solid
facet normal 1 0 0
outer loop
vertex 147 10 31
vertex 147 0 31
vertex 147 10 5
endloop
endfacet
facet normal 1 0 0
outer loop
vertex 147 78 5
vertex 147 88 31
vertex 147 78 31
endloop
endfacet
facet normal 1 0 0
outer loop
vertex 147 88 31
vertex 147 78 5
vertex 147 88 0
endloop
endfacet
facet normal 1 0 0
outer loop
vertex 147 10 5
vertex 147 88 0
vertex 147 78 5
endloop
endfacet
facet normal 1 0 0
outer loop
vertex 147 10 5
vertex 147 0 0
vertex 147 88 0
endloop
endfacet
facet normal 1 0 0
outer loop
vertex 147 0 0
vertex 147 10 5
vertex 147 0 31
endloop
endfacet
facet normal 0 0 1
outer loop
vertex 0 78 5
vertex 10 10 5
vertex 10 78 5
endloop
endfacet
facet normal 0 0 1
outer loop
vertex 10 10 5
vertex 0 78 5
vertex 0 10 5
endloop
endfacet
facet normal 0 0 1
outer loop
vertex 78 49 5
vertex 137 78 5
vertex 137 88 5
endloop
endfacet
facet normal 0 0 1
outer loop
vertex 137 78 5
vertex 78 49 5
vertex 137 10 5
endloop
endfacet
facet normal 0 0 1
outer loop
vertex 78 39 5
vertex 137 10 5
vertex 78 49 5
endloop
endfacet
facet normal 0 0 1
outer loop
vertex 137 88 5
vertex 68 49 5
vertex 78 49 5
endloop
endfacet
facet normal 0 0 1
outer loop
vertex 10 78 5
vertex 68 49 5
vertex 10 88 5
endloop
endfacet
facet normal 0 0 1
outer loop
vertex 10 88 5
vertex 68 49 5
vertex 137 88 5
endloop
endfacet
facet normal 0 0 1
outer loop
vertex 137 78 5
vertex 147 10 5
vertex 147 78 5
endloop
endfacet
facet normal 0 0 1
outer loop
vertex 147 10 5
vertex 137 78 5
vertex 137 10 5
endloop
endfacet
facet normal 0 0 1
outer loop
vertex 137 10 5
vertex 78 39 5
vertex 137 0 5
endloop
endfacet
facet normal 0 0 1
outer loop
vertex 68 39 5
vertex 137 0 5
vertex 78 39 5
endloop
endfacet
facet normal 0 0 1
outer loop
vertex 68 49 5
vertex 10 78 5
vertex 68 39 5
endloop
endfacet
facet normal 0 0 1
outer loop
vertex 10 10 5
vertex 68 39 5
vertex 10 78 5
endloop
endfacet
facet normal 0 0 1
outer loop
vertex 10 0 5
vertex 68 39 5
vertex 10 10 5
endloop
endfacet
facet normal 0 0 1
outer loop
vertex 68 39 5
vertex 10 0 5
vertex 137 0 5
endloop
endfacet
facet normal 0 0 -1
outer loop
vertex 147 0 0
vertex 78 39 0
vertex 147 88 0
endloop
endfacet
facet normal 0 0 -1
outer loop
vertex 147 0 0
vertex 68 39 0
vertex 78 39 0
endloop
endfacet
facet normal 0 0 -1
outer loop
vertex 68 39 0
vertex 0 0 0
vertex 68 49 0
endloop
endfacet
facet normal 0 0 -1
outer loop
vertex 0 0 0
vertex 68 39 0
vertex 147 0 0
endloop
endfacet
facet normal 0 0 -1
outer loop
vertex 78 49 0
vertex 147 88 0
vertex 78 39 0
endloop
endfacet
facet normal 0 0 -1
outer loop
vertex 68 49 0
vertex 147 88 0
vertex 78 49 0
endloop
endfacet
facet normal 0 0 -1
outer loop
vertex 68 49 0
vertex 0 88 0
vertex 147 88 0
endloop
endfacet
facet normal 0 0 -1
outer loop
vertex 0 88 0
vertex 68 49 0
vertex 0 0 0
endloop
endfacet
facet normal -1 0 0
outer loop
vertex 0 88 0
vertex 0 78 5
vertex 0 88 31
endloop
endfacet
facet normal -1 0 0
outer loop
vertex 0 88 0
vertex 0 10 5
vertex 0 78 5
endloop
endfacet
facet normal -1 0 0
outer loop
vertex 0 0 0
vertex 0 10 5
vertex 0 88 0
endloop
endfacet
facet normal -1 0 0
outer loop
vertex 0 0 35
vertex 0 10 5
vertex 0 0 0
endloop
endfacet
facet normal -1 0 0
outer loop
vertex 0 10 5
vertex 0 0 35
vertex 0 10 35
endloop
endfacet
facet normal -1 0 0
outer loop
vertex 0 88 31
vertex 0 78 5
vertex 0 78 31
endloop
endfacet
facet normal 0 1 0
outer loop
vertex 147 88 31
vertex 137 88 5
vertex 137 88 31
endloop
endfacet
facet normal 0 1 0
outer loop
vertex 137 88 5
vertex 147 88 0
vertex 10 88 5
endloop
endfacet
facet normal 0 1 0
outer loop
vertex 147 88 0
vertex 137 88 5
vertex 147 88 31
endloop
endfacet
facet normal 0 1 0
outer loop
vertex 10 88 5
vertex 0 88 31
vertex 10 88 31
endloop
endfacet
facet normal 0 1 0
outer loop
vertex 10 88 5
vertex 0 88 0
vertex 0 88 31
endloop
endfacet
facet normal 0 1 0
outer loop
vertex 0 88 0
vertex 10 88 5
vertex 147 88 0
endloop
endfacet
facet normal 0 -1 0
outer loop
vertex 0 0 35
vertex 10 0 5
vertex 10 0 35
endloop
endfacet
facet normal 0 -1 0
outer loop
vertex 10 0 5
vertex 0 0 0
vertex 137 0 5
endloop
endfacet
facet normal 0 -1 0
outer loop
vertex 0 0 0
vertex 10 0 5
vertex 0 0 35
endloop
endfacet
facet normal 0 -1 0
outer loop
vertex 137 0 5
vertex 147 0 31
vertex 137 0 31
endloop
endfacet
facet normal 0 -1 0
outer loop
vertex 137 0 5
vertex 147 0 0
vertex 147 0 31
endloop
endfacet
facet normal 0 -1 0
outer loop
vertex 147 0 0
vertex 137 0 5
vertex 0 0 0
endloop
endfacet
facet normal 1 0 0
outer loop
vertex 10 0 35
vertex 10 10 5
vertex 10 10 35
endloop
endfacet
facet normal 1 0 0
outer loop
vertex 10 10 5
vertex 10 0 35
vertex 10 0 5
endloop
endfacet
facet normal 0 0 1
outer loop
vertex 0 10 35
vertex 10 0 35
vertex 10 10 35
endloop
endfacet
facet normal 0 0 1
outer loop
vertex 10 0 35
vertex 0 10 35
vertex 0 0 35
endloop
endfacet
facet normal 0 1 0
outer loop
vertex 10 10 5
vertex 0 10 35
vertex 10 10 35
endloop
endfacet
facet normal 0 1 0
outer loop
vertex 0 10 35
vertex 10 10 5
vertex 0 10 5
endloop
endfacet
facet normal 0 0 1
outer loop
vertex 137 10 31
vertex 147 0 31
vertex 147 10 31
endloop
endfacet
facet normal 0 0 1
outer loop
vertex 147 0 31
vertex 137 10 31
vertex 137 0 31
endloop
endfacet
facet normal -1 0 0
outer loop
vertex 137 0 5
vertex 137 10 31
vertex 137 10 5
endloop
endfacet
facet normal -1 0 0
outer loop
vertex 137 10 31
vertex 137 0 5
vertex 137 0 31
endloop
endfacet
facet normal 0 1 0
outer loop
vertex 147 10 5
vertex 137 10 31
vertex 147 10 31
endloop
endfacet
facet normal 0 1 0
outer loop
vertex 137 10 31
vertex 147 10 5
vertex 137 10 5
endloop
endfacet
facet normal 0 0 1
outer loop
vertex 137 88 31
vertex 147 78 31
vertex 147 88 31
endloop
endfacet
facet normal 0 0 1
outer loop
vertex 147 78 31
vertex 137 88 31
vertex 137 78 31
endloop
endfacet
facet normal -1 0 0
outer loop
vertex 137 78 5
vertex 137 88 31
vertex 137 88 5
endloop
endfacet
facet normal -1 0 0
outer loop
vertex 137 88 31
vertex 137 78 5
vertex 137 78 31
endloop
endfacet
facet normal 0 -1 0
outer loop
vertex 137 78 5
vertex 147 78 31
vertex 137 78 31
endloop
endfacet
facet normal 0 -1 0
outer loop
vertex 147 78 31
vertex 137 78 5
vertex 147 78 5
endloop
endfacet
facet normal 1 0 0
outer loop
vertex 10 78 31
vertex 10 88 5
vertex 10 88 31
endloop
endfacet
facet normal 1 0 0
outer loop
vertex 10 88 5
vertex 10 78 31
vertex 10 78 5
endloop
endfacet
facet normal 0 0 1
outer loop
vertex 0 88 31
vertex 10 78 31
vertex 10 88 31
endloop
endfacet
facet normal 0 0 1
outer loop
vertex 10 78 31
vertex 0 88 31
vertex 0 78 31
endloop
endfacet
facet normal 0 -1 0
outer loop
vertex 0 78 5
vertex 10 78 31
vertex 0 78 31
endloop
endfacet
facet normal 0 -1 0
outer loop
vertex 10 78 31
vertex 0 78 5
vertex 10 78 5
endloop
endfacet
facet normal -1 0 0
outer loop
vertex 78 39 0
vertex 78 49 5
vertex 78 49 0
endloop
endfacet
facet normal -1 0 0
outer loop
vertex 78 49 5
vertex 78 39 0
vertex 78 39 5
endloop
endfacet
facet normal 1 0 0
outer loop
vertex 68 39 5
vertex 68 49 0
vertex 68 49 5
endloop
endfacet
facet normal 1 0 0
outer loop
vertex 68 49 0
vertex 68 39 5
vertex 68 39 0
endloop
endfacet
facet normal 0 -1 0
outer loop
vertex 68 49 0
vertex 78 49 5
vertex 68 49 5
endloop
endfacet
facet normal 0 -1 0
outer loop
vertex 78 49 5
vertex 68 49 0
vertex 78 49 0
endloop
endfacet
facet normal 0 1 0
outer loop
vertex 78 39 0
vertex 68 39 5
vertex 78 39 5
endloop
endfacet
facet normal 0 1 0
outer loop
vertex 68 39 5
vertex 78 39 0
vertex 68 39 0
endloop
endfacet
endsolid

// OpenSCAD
difference(){
    union(){
        cube([147,88,5]);
        translate([0,0,5]){
            cube([10,10,30]);
        }
        translate([137,0,5]){
            cube([10,10,26]);
        }
        translate([137,78,5]){
            cube([10,10,26]);
        }
        translate([0,78,5]){
            cube([10,10,26]);
        }
    }
    translate([68,39,0]){
        cube([10,10,5]);
    }
}
